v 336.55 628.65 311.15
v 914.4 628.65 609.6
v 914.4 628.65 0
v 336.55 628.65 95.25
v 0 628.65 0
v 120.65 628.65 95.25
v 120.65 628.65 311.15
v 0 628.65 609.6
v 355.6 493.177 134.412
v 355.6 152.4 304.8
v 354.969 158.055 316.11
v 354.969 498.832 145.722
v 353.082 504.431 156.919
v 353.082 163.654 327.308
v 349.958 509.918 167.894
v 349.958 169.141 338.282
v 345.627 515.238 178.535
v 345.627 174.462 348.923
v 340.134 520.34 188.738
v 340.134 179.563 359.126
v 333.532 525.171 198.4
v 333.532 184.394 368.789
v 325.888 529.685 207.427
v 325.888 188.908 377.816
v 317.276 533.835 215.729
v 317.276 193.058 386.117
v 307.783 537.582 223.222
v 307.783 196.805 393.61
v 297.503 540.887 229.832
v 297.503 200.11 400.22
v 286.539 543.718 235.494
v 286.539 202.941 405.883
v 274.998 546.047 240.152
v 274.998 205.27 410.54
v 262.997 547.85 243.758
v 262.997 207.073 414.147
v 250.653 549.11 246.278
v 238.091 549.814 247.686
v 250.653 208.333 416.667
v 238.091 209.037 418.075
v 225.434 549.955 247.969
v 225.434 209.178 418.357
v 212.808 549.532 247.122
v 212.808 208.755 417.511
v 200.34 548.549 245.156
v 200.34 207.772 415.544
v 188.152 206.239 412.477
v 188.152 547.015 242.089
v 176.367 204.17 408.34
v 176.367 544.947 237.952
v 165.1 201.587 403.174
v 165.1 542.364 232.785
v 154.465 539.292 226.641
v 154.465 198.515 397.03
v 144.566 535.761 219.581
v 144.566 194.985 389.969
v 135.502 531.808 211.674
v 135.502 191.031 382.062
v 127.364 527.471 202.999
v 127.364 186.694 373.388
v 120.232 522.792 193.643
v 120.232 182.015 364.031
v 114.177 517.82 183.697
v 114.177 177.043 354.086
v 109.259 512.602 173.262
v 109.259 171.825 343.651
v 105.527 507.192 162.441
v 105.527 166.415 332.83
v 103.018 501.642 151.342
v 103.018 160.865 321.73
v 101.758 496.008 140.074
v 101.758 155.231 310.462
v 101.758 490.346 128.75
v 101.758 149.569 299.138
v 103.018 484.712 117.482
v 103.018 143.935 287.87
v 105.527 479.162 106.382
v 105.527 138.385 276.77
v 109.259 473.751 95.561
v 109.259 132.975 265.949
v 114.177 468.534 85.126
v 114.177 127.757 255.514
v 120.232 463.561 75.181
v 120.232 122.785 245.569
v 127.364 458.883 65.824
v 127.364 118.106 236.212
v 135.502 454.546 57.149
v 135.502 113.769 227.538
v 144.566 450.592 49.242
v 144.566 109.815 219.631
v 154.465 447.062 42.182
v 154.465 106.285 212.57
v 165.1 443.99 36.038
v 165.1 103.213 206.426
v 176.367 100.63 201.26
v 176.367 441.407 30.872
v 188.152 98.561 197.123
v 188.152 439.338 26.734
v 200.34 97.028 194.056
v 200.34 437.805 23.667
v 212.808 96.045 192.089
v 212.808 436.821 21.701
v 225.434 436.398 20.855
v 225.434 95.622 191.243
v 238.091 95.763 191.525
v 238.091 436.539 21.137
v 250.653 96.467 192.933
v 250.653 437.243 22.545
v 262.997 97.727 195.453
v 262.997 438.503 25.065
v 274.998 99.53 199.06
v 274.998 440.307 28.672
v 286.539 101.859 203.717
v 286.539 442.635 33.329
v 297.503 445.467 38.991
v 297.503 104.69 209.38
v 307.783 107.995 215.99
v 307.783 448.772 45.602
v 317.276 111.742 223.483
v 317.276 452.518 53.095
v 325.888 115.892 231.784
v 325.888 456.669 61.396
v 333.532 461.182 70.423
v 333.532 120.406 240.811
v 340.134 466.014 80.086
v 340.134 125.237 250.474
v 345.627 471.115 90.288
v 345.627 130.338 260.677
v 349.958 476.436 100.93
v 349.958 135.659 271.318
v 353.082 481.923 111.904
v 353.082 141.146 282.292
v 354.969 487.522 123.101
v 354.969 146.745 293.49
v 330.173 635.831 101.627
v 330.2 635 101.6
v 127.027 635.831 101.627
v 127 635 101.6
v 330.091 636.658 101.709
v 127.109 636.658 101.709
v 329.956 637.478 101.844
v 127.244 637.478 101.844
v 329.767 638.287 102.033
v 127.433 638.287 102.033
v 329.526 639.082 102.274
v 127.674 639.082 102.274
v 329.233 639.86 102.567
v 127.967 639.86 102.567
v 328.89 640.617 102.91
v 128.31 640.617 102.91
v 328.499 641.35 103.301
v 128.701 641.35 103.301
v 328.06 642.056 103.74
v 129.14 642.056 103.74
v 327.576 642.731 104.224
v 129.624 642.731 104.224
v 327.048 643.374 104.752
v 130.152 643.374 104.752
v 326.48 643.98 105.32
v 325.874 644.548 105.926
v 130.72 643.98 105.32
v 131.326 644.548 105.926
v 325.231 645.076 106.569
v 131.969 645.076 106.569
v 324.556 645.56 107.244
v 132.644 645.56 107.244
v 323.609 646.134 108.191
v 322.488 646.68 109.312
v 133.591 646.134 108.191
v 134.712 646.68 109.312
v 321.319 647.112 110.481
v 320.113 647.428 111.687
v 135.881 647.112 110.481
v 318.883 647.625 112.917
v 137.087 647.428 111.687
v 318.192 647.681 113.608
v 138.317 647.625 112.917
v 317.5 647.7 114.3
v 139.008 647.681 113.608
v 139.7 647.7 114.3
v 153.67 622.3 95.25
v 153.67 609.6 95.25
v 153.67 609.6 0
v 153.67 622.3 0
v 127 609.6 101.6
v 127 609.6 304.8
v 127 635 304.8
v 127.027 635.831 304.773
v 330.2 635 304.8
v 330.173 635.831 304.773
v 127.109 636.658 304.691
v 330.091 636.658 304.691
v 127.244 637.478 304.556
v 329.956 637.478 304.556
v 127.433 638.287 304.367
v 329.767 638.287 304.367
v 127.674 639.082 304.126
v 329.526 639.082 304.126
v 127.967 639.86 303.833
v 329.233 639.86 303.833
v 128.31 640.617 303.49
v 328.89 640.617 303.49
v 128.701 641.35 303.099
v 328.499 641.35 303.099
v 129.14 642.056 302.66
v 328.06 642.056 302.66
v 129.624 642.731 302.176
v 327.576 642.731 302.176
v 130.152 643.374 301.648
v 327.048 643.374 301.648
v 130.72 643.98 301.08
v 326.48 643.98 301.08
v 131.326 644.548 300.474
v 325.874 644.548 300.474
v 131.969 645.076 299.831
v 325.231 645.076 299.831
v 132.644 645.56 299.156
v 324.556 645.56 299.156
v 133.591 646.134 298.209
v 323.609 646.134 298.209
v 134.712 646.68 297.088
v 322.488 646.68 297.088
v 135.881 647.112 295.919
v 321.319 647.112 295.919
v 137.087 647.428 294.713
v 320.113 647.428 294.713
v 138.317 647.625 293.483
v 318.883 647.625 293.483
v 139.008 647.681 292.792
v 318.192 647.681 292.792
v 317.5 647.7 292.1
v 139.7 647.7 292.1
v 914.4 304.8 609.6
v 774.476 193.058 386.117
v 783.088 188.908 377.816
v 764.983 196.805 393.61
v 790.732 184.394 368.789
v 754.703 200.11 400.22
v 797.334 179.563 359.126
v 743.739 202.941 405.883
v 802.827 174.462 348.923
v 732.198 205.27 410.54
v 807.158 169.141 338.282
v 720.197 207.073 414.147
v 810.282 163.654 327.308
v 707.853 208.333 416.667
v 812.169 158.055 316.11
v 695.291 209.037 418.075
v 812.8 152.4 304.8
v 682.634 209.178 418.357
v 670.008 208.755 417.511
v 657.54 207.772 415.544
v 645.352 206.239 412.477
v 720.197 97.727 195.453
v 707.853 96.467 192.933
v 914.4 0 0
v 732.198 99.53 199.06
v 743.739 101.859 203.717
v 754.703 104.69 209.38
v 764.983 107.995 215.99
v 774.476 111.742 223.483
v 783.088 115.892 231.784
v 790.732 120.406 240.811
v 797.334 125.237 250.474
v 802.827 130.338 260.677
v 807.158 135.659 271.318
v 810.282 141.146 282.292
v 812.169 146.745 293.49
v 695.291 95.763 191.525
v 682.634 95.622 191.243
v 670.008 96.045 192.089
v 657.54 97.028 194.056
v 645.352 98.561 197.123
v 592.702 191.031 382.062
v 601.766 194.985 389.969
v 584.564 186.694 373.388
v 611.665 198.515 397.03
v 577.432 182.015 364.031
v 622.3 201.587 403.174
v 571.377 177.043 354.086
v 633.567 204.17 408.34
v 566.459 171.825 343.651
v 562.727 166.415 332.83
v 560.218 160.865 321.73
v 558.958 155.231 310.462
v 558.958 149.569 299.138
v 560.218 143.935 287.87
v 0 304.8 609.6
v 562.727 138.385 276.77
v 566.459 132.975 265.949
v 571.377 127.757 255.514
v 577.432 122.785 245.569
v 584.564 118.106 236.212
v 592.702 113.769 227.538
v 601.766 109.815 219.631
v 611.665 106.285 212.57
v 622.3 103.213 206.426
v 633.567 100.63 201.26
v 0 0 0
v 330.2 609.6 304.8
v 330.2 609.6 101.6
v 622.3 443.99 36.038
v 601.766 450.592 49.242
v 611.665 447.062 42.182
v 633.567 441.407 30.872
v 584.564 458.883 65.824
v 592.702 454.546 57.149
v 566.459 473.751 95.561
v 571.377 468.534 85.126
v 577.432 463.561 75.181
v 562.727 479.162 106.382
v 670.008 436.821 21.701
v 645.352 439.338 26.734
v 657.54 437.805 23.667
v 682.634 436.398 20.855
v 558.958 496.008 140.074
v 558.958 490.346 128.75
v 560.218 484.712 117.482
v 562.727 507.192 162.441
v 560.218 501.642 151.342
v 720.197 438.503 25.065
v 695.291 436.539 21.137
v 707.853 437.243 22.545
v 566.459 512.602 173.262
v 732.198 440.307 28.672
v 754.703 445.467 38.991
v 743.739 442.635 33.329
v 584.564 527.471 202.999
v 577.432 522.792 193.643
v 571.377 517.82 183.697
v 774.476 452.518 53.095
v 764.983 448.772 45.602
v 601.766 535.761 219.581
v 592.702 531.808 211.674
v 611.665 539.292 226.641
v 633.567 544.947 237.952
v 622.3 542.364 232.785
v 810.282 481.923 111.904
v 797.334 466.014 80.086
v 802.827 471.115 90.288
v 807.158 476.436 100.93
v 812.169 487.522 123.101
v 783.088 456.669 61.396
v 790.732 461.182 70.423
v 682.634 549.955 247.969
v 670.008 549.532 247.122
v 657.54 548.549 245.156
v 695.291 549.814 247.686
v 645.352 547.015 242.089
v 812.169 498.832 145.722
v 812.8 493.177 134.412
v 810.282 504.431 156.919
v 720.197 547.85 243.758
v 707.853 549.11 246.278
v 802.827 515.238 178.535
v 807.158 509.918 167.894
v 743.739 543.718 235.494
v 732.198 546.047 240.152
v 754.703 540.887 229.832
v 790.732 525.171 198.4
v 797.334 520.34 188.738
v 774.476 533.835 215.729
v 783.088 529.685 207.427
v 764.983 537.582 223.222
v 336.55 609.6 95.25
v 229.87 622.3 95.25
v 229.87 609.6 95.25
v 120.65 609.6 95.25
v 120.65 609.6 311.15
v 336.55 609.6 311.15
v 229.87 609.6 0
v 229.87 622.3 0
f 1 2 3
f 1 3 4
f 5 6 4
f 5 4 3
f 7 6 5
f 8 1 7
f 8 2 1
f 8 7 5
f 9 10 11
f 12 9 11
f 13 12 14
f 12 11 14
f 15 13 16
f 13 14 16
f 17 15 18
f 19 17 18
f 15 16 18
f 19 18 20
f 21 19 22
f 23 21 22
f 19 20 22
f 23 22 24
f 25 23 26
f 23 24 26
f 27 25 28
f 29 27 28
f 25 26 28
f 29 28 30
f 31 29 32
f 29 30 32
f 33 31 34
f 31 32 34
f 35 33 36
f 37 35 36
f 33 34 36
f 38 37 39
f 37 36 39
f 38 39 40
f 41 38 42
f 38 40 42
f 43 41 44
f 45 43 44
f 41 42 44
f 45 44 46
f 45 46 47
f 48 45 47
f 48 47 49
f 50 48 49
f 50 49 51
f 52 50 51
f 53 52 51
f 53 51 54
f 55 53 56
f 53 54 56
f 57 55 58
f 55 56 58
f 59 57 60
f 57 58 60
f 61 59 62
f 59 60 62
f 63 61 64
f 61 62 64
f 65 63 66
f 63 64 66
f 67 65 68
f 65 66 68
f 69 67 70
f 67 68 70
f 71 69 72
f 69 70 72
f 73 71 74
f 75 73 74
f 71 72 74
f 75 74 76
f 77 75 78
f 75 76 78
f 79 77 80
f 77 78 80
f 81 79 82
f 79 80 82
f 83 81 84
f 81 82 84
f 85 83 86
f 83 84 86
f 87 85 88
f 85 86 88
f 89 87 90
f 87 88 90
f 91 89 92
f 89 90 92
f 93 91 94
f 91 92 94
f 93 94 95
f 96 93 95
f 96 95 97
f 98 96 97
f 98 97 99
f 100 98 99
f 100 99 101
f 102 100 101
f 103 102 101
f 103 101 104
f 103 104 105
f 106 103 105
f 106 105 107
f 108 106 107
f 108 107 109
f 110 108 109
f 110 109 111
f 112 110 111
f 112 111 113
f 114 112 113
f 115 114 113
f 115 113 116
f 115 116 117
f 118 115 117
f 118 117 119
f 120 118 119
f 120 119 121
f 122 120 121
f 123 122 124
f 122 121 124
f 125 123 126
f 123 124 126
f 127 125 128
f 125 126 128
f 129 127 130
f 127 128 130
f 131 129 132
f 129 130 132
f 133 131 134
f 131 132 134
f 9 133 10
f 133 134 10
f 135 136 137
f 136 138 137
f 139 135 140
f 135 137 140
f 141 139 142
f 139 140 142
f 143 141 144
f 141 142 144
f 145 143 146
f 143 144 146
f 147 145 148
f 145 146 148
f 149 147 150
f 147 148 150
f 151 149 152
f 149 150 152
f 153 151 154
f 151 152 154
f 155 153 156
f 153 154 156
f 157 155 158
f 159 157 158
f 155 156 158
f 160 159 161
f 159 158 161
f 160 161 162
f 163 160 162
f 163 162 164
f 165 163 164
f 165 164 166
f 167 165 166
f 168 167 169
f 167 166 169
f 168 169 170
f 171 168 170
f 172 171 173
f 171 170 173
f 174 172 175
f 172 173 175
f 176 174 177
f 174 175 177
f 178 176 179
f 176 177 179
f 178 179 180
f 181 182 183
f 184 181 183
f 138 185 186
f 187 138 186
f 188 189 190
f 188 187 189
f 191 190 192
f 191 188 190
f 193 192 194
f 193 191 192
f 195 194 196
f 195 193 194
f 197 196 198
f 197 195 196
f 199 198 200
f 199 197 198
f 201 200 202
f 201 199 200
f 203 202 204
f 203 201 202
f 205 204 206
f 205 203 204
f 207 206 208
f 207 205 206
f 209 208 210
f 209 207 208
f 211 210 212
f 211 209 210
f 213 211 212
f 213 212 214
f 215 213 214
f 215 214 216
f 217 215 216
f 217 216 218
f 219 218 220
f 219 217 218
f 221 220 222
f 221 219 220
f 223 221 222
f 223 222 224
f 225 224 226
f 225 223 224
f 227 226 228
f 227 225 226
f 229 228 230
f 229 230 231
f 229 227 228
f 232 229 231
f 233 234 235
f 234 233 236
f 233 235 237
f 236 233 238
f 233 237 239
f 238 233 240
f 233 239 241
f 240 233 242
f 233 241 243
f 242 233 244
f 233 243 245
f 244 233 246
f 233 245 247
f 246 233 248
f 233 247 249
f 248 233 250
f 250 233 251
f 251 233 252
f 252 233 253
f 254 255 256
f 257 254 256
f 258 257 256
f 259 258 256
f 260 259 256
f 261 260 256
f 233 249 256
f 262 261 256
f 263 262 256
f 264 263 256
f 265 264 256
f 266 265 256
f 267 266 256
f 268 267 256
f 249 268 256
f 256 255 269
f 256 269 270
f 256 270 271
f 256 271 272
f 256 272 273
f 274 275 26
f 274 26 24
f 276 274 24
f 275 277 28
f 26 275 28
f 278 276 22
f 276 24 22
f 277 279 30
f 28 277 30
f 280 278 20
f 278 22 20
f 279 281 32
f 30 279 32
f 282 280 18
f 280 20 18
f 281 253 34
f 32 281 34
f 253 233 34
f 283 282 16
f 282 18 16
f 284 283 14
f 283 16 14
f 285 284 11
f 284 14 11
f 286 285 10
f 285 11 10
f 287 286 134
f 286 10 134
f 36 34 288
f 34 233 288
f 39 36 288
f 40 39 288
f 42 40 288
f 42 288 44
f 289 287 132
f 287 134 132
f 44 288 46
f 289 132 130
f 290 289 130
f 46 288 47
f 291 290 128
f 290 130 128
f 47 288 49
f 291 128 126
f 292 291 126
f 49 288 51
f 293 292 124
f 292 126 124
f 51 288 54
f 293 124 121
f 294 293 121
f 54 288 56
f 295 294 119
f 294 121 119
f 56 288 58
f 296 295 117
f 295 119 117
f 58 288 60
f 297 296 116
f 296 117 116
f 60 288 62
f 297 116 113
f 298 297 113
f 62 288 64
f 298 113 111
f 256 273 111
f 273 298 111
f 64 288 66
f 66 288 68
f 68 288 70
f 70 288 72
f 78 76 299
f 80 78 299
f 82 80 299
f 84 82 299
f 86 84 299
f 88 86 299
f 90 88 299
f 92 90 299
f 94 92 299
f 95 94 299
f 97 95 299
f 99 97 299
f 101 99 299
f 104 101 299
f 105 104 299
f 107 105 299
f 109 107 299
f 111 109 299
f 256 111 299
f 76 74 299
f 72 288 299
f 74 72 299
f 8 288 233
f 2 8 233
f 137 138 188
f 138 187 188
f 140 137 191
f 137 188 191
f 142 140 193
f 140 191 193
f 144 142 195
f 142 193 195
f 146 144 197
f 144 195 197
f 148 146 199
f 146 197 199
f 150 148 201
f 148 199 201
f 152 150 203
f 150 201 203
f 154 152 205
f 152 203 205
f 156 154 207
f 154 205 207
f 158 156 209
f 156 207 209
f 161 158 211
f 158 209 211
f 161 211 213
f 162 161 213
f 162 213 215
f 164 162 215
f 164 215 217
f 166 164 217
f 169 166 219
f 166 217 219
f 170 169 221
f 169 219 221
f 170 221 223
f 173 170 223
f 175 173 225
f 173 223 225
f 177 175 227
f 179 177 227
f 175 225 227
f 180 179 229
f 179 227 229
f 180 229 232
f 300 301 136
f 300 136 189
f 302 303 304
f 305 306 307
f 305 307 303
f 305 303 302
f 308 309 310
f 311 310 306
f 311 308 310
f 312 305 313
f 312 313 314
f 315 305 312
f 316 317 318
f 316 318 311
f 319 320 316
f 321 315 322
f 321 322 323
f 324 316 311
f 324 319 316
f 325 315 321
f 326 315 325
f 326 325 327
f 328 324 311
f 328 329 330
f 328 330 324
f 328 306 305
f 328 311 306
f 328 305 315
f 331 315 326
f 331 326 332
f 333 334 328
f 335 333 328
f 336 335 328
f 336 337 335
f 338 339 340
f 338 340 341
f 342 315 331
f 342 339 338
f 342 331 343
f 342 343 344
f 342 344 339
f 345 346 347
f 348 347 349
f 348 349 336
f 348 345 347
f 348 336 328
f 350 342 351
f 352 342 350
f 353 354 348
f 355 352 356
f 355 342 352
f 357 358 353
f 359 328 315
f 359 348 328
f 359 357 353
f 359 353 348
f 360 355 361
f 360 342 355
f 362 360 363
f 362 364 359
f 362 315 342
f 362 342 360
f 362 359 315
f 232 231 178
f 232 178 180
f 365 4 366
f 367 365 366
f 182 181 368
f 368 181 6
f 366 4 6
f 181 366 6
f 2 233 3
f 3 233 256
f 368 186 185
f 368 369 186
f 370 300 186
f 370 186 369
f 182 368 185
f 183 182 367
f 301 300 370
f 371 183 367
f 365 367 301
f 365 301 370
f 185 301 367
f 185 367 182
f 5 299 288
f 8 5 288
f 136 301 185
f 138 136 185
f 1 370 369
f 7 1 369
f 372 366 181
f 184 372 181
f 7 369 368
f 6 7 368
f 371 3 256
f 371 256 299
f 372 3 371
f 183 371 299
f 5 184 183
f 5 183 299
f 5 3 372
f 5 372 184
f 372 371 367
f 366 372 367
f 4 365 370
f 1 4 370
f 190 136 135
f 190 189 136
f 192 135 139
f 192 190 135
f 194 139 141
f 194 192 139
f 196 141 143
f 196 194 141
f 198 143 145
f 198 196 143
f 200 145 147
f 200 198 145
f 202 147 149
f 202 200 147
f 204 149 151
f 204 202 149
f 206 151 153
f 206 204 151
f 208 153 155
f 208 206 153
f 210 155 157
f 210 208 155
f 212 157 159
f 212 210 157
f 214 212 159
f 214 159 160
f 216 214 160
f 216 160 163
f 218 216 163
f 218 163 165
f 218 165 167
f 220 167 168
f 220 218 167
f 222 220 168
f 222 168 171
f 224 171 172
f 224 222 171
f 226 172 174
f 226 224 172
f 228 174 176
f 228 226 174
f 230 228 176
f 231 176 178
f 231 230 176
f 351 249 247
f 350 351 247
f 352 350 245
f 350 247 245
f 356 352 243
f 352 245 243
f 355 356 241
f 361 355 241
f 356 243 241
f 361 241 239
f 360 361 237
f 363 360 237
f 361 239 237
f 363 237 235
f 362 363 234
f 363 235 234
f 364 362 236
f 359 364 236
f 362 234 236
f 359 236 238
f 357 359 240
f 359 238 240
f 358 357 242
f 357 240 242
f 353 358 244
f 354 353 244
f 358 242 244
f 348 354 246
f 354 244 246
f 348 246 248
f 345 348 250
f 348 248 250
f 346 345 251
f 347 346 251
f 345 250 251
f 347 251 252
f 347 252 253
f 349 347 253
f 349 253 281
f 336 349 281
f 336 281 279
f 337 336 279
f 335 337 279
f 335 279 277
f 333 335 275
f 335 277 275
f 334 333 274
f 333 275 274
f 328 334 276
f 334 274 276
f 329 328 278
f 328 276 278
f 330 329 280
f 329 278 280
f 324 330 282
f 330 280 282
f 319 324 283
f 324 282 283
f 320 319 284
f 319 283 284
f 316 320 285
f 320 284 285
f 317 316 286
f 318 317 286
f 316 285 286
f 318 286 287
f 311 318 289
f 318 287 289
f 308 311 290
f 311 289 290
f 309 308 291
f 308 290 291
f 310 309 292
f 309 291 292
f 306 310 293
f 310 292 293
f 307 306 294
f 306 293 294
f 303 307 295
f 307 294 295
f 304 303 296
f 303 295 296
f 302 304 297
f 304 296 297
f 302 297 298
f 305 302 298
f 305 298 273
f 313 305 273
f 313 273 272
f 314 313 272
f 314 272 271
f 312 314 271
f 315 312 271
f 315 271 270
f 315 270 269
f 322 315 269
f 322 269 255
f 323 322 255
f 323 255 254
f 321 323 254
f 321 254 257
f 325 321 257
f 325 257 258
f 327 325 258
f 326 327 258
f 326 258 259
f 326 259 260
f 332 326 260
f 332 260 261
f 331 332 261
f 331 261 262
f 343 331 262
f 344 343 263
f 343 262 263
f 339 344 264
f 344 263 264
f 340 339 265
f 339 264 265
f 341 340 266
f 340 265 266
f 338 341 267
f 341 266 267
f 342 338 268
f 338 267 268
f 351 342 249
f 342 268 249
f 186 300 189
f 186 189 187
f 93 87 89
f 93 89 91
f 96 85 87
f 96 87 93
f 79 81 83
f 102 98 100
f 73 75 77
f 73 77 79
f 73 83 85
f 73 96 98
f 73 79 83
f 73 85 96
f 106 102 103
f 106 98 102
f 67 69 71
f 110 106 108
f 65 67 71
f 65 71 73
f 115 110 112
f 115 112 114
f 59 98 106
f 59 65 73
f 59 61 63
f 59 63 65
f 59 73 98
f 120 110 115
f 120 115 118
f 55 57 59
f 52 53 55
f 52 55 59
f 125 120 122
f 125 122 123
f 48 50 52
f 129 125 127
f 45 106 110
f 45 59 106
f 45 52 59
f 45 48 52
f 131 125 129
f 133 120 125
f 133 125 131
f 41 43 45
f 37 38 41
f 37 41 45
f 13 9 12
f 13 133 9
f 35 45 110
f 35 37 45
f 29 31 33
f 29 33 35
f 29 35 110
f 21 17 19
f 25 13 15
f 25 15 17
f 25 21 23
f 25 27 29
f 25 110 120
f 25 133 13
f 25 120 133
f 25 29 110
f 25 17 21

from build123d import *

# Parameters (mm, degrees)
F0_W      = 914.4
F0_H      = 609.6
F1_DEPTH  = 609.6
F3_DEPTH  = 914.401
F4_R      = 127
F5_DEPTH  = 381
F6_W      = 203.2
F6_H      = 203.2
F7_DEPTH  = 38.1
F8_R      = 12.7
F10_DEPTH = 19.05
F11_W     = 76.2
F11_H     = 95.25
F12_DEPTH = 6.35


with BuildPart() as f1:
    # F0 (on Top) → F1 (new body)
    with BuildSketch(Plane.XY):
        with Locations((457.2, 304.8)):
            Rectangle(F0_W, F0_H)
    extrude(amount=F1_DEPTH)

    # F2 (on face) → F3 (cut, through all)
    with BuildSketch(Plane(origin=(0, 0, 0), x_dir=(0, -1, 0), z_dir=(-1, 0, 0))):
        Polygon((0, 609.6), (-304.8, 609.6), (0, 0), align=None)
    extrude(amount=-F3_DEPTH, mode=Mode.SUBTRACT)

    # F4 (on face) → F5 (cut)
    with BuildSketch(Plane(origin=(0, 0, 0), x_dir=(1, 0, 0), z_dir=(0, -0.894427191, 0.4472135955))):
        with Locations((228.6, 340.776759771)):
            Circle(F4_R)
        with Locations((685.8, 340.776759771)):
            Circle(F4_R)
    extrude(amount=-F5_DEPTH, mode=Mode.SUBTRACT)

    # F6 (on face) → F7 (join)
    with BuildSketch(Plane(origin=(0, 609.6, 0), x_dir=(-1, 0, 0), z_dir=(0, 1, 0))):
        with Locations((-228.6, 203.2)):
            Rectangle(F6_W, F6_H)
    extrude(amount=F7_DEPTH)

    # F8
    f8_edges = [f1.edges().sort_by_distance(p)[0] for p in [
        (127, 647.7, 203.2),
        (228.6, 647.7, 304.8),
        (330.2, 647.7, 203.2),
        (228.6, 647.7, 101.6),
    ]]
    fillet(f8_edges, radius=F8_R)

    # F9 (on face) → F10 (join)
    with BuildSketch(Plane(origin=(0, 609.6, 0), x_dir=(-1, 0, 0), z_dir=(0, 1, 0))):
        Polygon((0, 609.6), (-914.4, 609.6), (-914.4, 0), (-229.87, 0), (-229.87, 95.25), (-336.55, 95.25), (-336.55, 311.15), (-120.65, 311.15), (-120.65, 95.25), (-153.67, 95.25), (-153.67, 0), (0, 0), align=None)
    extrude(amount=F10_DEPTH)

    # F11 (on face) → F12 (join)
    with BuildSketch(Plane(origin=(0, 628.65, 0), x_dir=(-1, 0, 0), z_dir=(0, 1, 0))):
        with Locations((-191.77, 47.625)):
            Rectangle(F11_W, F11_H)
    extrude(amount=-F12_DEPTH)


solid = f1.part
